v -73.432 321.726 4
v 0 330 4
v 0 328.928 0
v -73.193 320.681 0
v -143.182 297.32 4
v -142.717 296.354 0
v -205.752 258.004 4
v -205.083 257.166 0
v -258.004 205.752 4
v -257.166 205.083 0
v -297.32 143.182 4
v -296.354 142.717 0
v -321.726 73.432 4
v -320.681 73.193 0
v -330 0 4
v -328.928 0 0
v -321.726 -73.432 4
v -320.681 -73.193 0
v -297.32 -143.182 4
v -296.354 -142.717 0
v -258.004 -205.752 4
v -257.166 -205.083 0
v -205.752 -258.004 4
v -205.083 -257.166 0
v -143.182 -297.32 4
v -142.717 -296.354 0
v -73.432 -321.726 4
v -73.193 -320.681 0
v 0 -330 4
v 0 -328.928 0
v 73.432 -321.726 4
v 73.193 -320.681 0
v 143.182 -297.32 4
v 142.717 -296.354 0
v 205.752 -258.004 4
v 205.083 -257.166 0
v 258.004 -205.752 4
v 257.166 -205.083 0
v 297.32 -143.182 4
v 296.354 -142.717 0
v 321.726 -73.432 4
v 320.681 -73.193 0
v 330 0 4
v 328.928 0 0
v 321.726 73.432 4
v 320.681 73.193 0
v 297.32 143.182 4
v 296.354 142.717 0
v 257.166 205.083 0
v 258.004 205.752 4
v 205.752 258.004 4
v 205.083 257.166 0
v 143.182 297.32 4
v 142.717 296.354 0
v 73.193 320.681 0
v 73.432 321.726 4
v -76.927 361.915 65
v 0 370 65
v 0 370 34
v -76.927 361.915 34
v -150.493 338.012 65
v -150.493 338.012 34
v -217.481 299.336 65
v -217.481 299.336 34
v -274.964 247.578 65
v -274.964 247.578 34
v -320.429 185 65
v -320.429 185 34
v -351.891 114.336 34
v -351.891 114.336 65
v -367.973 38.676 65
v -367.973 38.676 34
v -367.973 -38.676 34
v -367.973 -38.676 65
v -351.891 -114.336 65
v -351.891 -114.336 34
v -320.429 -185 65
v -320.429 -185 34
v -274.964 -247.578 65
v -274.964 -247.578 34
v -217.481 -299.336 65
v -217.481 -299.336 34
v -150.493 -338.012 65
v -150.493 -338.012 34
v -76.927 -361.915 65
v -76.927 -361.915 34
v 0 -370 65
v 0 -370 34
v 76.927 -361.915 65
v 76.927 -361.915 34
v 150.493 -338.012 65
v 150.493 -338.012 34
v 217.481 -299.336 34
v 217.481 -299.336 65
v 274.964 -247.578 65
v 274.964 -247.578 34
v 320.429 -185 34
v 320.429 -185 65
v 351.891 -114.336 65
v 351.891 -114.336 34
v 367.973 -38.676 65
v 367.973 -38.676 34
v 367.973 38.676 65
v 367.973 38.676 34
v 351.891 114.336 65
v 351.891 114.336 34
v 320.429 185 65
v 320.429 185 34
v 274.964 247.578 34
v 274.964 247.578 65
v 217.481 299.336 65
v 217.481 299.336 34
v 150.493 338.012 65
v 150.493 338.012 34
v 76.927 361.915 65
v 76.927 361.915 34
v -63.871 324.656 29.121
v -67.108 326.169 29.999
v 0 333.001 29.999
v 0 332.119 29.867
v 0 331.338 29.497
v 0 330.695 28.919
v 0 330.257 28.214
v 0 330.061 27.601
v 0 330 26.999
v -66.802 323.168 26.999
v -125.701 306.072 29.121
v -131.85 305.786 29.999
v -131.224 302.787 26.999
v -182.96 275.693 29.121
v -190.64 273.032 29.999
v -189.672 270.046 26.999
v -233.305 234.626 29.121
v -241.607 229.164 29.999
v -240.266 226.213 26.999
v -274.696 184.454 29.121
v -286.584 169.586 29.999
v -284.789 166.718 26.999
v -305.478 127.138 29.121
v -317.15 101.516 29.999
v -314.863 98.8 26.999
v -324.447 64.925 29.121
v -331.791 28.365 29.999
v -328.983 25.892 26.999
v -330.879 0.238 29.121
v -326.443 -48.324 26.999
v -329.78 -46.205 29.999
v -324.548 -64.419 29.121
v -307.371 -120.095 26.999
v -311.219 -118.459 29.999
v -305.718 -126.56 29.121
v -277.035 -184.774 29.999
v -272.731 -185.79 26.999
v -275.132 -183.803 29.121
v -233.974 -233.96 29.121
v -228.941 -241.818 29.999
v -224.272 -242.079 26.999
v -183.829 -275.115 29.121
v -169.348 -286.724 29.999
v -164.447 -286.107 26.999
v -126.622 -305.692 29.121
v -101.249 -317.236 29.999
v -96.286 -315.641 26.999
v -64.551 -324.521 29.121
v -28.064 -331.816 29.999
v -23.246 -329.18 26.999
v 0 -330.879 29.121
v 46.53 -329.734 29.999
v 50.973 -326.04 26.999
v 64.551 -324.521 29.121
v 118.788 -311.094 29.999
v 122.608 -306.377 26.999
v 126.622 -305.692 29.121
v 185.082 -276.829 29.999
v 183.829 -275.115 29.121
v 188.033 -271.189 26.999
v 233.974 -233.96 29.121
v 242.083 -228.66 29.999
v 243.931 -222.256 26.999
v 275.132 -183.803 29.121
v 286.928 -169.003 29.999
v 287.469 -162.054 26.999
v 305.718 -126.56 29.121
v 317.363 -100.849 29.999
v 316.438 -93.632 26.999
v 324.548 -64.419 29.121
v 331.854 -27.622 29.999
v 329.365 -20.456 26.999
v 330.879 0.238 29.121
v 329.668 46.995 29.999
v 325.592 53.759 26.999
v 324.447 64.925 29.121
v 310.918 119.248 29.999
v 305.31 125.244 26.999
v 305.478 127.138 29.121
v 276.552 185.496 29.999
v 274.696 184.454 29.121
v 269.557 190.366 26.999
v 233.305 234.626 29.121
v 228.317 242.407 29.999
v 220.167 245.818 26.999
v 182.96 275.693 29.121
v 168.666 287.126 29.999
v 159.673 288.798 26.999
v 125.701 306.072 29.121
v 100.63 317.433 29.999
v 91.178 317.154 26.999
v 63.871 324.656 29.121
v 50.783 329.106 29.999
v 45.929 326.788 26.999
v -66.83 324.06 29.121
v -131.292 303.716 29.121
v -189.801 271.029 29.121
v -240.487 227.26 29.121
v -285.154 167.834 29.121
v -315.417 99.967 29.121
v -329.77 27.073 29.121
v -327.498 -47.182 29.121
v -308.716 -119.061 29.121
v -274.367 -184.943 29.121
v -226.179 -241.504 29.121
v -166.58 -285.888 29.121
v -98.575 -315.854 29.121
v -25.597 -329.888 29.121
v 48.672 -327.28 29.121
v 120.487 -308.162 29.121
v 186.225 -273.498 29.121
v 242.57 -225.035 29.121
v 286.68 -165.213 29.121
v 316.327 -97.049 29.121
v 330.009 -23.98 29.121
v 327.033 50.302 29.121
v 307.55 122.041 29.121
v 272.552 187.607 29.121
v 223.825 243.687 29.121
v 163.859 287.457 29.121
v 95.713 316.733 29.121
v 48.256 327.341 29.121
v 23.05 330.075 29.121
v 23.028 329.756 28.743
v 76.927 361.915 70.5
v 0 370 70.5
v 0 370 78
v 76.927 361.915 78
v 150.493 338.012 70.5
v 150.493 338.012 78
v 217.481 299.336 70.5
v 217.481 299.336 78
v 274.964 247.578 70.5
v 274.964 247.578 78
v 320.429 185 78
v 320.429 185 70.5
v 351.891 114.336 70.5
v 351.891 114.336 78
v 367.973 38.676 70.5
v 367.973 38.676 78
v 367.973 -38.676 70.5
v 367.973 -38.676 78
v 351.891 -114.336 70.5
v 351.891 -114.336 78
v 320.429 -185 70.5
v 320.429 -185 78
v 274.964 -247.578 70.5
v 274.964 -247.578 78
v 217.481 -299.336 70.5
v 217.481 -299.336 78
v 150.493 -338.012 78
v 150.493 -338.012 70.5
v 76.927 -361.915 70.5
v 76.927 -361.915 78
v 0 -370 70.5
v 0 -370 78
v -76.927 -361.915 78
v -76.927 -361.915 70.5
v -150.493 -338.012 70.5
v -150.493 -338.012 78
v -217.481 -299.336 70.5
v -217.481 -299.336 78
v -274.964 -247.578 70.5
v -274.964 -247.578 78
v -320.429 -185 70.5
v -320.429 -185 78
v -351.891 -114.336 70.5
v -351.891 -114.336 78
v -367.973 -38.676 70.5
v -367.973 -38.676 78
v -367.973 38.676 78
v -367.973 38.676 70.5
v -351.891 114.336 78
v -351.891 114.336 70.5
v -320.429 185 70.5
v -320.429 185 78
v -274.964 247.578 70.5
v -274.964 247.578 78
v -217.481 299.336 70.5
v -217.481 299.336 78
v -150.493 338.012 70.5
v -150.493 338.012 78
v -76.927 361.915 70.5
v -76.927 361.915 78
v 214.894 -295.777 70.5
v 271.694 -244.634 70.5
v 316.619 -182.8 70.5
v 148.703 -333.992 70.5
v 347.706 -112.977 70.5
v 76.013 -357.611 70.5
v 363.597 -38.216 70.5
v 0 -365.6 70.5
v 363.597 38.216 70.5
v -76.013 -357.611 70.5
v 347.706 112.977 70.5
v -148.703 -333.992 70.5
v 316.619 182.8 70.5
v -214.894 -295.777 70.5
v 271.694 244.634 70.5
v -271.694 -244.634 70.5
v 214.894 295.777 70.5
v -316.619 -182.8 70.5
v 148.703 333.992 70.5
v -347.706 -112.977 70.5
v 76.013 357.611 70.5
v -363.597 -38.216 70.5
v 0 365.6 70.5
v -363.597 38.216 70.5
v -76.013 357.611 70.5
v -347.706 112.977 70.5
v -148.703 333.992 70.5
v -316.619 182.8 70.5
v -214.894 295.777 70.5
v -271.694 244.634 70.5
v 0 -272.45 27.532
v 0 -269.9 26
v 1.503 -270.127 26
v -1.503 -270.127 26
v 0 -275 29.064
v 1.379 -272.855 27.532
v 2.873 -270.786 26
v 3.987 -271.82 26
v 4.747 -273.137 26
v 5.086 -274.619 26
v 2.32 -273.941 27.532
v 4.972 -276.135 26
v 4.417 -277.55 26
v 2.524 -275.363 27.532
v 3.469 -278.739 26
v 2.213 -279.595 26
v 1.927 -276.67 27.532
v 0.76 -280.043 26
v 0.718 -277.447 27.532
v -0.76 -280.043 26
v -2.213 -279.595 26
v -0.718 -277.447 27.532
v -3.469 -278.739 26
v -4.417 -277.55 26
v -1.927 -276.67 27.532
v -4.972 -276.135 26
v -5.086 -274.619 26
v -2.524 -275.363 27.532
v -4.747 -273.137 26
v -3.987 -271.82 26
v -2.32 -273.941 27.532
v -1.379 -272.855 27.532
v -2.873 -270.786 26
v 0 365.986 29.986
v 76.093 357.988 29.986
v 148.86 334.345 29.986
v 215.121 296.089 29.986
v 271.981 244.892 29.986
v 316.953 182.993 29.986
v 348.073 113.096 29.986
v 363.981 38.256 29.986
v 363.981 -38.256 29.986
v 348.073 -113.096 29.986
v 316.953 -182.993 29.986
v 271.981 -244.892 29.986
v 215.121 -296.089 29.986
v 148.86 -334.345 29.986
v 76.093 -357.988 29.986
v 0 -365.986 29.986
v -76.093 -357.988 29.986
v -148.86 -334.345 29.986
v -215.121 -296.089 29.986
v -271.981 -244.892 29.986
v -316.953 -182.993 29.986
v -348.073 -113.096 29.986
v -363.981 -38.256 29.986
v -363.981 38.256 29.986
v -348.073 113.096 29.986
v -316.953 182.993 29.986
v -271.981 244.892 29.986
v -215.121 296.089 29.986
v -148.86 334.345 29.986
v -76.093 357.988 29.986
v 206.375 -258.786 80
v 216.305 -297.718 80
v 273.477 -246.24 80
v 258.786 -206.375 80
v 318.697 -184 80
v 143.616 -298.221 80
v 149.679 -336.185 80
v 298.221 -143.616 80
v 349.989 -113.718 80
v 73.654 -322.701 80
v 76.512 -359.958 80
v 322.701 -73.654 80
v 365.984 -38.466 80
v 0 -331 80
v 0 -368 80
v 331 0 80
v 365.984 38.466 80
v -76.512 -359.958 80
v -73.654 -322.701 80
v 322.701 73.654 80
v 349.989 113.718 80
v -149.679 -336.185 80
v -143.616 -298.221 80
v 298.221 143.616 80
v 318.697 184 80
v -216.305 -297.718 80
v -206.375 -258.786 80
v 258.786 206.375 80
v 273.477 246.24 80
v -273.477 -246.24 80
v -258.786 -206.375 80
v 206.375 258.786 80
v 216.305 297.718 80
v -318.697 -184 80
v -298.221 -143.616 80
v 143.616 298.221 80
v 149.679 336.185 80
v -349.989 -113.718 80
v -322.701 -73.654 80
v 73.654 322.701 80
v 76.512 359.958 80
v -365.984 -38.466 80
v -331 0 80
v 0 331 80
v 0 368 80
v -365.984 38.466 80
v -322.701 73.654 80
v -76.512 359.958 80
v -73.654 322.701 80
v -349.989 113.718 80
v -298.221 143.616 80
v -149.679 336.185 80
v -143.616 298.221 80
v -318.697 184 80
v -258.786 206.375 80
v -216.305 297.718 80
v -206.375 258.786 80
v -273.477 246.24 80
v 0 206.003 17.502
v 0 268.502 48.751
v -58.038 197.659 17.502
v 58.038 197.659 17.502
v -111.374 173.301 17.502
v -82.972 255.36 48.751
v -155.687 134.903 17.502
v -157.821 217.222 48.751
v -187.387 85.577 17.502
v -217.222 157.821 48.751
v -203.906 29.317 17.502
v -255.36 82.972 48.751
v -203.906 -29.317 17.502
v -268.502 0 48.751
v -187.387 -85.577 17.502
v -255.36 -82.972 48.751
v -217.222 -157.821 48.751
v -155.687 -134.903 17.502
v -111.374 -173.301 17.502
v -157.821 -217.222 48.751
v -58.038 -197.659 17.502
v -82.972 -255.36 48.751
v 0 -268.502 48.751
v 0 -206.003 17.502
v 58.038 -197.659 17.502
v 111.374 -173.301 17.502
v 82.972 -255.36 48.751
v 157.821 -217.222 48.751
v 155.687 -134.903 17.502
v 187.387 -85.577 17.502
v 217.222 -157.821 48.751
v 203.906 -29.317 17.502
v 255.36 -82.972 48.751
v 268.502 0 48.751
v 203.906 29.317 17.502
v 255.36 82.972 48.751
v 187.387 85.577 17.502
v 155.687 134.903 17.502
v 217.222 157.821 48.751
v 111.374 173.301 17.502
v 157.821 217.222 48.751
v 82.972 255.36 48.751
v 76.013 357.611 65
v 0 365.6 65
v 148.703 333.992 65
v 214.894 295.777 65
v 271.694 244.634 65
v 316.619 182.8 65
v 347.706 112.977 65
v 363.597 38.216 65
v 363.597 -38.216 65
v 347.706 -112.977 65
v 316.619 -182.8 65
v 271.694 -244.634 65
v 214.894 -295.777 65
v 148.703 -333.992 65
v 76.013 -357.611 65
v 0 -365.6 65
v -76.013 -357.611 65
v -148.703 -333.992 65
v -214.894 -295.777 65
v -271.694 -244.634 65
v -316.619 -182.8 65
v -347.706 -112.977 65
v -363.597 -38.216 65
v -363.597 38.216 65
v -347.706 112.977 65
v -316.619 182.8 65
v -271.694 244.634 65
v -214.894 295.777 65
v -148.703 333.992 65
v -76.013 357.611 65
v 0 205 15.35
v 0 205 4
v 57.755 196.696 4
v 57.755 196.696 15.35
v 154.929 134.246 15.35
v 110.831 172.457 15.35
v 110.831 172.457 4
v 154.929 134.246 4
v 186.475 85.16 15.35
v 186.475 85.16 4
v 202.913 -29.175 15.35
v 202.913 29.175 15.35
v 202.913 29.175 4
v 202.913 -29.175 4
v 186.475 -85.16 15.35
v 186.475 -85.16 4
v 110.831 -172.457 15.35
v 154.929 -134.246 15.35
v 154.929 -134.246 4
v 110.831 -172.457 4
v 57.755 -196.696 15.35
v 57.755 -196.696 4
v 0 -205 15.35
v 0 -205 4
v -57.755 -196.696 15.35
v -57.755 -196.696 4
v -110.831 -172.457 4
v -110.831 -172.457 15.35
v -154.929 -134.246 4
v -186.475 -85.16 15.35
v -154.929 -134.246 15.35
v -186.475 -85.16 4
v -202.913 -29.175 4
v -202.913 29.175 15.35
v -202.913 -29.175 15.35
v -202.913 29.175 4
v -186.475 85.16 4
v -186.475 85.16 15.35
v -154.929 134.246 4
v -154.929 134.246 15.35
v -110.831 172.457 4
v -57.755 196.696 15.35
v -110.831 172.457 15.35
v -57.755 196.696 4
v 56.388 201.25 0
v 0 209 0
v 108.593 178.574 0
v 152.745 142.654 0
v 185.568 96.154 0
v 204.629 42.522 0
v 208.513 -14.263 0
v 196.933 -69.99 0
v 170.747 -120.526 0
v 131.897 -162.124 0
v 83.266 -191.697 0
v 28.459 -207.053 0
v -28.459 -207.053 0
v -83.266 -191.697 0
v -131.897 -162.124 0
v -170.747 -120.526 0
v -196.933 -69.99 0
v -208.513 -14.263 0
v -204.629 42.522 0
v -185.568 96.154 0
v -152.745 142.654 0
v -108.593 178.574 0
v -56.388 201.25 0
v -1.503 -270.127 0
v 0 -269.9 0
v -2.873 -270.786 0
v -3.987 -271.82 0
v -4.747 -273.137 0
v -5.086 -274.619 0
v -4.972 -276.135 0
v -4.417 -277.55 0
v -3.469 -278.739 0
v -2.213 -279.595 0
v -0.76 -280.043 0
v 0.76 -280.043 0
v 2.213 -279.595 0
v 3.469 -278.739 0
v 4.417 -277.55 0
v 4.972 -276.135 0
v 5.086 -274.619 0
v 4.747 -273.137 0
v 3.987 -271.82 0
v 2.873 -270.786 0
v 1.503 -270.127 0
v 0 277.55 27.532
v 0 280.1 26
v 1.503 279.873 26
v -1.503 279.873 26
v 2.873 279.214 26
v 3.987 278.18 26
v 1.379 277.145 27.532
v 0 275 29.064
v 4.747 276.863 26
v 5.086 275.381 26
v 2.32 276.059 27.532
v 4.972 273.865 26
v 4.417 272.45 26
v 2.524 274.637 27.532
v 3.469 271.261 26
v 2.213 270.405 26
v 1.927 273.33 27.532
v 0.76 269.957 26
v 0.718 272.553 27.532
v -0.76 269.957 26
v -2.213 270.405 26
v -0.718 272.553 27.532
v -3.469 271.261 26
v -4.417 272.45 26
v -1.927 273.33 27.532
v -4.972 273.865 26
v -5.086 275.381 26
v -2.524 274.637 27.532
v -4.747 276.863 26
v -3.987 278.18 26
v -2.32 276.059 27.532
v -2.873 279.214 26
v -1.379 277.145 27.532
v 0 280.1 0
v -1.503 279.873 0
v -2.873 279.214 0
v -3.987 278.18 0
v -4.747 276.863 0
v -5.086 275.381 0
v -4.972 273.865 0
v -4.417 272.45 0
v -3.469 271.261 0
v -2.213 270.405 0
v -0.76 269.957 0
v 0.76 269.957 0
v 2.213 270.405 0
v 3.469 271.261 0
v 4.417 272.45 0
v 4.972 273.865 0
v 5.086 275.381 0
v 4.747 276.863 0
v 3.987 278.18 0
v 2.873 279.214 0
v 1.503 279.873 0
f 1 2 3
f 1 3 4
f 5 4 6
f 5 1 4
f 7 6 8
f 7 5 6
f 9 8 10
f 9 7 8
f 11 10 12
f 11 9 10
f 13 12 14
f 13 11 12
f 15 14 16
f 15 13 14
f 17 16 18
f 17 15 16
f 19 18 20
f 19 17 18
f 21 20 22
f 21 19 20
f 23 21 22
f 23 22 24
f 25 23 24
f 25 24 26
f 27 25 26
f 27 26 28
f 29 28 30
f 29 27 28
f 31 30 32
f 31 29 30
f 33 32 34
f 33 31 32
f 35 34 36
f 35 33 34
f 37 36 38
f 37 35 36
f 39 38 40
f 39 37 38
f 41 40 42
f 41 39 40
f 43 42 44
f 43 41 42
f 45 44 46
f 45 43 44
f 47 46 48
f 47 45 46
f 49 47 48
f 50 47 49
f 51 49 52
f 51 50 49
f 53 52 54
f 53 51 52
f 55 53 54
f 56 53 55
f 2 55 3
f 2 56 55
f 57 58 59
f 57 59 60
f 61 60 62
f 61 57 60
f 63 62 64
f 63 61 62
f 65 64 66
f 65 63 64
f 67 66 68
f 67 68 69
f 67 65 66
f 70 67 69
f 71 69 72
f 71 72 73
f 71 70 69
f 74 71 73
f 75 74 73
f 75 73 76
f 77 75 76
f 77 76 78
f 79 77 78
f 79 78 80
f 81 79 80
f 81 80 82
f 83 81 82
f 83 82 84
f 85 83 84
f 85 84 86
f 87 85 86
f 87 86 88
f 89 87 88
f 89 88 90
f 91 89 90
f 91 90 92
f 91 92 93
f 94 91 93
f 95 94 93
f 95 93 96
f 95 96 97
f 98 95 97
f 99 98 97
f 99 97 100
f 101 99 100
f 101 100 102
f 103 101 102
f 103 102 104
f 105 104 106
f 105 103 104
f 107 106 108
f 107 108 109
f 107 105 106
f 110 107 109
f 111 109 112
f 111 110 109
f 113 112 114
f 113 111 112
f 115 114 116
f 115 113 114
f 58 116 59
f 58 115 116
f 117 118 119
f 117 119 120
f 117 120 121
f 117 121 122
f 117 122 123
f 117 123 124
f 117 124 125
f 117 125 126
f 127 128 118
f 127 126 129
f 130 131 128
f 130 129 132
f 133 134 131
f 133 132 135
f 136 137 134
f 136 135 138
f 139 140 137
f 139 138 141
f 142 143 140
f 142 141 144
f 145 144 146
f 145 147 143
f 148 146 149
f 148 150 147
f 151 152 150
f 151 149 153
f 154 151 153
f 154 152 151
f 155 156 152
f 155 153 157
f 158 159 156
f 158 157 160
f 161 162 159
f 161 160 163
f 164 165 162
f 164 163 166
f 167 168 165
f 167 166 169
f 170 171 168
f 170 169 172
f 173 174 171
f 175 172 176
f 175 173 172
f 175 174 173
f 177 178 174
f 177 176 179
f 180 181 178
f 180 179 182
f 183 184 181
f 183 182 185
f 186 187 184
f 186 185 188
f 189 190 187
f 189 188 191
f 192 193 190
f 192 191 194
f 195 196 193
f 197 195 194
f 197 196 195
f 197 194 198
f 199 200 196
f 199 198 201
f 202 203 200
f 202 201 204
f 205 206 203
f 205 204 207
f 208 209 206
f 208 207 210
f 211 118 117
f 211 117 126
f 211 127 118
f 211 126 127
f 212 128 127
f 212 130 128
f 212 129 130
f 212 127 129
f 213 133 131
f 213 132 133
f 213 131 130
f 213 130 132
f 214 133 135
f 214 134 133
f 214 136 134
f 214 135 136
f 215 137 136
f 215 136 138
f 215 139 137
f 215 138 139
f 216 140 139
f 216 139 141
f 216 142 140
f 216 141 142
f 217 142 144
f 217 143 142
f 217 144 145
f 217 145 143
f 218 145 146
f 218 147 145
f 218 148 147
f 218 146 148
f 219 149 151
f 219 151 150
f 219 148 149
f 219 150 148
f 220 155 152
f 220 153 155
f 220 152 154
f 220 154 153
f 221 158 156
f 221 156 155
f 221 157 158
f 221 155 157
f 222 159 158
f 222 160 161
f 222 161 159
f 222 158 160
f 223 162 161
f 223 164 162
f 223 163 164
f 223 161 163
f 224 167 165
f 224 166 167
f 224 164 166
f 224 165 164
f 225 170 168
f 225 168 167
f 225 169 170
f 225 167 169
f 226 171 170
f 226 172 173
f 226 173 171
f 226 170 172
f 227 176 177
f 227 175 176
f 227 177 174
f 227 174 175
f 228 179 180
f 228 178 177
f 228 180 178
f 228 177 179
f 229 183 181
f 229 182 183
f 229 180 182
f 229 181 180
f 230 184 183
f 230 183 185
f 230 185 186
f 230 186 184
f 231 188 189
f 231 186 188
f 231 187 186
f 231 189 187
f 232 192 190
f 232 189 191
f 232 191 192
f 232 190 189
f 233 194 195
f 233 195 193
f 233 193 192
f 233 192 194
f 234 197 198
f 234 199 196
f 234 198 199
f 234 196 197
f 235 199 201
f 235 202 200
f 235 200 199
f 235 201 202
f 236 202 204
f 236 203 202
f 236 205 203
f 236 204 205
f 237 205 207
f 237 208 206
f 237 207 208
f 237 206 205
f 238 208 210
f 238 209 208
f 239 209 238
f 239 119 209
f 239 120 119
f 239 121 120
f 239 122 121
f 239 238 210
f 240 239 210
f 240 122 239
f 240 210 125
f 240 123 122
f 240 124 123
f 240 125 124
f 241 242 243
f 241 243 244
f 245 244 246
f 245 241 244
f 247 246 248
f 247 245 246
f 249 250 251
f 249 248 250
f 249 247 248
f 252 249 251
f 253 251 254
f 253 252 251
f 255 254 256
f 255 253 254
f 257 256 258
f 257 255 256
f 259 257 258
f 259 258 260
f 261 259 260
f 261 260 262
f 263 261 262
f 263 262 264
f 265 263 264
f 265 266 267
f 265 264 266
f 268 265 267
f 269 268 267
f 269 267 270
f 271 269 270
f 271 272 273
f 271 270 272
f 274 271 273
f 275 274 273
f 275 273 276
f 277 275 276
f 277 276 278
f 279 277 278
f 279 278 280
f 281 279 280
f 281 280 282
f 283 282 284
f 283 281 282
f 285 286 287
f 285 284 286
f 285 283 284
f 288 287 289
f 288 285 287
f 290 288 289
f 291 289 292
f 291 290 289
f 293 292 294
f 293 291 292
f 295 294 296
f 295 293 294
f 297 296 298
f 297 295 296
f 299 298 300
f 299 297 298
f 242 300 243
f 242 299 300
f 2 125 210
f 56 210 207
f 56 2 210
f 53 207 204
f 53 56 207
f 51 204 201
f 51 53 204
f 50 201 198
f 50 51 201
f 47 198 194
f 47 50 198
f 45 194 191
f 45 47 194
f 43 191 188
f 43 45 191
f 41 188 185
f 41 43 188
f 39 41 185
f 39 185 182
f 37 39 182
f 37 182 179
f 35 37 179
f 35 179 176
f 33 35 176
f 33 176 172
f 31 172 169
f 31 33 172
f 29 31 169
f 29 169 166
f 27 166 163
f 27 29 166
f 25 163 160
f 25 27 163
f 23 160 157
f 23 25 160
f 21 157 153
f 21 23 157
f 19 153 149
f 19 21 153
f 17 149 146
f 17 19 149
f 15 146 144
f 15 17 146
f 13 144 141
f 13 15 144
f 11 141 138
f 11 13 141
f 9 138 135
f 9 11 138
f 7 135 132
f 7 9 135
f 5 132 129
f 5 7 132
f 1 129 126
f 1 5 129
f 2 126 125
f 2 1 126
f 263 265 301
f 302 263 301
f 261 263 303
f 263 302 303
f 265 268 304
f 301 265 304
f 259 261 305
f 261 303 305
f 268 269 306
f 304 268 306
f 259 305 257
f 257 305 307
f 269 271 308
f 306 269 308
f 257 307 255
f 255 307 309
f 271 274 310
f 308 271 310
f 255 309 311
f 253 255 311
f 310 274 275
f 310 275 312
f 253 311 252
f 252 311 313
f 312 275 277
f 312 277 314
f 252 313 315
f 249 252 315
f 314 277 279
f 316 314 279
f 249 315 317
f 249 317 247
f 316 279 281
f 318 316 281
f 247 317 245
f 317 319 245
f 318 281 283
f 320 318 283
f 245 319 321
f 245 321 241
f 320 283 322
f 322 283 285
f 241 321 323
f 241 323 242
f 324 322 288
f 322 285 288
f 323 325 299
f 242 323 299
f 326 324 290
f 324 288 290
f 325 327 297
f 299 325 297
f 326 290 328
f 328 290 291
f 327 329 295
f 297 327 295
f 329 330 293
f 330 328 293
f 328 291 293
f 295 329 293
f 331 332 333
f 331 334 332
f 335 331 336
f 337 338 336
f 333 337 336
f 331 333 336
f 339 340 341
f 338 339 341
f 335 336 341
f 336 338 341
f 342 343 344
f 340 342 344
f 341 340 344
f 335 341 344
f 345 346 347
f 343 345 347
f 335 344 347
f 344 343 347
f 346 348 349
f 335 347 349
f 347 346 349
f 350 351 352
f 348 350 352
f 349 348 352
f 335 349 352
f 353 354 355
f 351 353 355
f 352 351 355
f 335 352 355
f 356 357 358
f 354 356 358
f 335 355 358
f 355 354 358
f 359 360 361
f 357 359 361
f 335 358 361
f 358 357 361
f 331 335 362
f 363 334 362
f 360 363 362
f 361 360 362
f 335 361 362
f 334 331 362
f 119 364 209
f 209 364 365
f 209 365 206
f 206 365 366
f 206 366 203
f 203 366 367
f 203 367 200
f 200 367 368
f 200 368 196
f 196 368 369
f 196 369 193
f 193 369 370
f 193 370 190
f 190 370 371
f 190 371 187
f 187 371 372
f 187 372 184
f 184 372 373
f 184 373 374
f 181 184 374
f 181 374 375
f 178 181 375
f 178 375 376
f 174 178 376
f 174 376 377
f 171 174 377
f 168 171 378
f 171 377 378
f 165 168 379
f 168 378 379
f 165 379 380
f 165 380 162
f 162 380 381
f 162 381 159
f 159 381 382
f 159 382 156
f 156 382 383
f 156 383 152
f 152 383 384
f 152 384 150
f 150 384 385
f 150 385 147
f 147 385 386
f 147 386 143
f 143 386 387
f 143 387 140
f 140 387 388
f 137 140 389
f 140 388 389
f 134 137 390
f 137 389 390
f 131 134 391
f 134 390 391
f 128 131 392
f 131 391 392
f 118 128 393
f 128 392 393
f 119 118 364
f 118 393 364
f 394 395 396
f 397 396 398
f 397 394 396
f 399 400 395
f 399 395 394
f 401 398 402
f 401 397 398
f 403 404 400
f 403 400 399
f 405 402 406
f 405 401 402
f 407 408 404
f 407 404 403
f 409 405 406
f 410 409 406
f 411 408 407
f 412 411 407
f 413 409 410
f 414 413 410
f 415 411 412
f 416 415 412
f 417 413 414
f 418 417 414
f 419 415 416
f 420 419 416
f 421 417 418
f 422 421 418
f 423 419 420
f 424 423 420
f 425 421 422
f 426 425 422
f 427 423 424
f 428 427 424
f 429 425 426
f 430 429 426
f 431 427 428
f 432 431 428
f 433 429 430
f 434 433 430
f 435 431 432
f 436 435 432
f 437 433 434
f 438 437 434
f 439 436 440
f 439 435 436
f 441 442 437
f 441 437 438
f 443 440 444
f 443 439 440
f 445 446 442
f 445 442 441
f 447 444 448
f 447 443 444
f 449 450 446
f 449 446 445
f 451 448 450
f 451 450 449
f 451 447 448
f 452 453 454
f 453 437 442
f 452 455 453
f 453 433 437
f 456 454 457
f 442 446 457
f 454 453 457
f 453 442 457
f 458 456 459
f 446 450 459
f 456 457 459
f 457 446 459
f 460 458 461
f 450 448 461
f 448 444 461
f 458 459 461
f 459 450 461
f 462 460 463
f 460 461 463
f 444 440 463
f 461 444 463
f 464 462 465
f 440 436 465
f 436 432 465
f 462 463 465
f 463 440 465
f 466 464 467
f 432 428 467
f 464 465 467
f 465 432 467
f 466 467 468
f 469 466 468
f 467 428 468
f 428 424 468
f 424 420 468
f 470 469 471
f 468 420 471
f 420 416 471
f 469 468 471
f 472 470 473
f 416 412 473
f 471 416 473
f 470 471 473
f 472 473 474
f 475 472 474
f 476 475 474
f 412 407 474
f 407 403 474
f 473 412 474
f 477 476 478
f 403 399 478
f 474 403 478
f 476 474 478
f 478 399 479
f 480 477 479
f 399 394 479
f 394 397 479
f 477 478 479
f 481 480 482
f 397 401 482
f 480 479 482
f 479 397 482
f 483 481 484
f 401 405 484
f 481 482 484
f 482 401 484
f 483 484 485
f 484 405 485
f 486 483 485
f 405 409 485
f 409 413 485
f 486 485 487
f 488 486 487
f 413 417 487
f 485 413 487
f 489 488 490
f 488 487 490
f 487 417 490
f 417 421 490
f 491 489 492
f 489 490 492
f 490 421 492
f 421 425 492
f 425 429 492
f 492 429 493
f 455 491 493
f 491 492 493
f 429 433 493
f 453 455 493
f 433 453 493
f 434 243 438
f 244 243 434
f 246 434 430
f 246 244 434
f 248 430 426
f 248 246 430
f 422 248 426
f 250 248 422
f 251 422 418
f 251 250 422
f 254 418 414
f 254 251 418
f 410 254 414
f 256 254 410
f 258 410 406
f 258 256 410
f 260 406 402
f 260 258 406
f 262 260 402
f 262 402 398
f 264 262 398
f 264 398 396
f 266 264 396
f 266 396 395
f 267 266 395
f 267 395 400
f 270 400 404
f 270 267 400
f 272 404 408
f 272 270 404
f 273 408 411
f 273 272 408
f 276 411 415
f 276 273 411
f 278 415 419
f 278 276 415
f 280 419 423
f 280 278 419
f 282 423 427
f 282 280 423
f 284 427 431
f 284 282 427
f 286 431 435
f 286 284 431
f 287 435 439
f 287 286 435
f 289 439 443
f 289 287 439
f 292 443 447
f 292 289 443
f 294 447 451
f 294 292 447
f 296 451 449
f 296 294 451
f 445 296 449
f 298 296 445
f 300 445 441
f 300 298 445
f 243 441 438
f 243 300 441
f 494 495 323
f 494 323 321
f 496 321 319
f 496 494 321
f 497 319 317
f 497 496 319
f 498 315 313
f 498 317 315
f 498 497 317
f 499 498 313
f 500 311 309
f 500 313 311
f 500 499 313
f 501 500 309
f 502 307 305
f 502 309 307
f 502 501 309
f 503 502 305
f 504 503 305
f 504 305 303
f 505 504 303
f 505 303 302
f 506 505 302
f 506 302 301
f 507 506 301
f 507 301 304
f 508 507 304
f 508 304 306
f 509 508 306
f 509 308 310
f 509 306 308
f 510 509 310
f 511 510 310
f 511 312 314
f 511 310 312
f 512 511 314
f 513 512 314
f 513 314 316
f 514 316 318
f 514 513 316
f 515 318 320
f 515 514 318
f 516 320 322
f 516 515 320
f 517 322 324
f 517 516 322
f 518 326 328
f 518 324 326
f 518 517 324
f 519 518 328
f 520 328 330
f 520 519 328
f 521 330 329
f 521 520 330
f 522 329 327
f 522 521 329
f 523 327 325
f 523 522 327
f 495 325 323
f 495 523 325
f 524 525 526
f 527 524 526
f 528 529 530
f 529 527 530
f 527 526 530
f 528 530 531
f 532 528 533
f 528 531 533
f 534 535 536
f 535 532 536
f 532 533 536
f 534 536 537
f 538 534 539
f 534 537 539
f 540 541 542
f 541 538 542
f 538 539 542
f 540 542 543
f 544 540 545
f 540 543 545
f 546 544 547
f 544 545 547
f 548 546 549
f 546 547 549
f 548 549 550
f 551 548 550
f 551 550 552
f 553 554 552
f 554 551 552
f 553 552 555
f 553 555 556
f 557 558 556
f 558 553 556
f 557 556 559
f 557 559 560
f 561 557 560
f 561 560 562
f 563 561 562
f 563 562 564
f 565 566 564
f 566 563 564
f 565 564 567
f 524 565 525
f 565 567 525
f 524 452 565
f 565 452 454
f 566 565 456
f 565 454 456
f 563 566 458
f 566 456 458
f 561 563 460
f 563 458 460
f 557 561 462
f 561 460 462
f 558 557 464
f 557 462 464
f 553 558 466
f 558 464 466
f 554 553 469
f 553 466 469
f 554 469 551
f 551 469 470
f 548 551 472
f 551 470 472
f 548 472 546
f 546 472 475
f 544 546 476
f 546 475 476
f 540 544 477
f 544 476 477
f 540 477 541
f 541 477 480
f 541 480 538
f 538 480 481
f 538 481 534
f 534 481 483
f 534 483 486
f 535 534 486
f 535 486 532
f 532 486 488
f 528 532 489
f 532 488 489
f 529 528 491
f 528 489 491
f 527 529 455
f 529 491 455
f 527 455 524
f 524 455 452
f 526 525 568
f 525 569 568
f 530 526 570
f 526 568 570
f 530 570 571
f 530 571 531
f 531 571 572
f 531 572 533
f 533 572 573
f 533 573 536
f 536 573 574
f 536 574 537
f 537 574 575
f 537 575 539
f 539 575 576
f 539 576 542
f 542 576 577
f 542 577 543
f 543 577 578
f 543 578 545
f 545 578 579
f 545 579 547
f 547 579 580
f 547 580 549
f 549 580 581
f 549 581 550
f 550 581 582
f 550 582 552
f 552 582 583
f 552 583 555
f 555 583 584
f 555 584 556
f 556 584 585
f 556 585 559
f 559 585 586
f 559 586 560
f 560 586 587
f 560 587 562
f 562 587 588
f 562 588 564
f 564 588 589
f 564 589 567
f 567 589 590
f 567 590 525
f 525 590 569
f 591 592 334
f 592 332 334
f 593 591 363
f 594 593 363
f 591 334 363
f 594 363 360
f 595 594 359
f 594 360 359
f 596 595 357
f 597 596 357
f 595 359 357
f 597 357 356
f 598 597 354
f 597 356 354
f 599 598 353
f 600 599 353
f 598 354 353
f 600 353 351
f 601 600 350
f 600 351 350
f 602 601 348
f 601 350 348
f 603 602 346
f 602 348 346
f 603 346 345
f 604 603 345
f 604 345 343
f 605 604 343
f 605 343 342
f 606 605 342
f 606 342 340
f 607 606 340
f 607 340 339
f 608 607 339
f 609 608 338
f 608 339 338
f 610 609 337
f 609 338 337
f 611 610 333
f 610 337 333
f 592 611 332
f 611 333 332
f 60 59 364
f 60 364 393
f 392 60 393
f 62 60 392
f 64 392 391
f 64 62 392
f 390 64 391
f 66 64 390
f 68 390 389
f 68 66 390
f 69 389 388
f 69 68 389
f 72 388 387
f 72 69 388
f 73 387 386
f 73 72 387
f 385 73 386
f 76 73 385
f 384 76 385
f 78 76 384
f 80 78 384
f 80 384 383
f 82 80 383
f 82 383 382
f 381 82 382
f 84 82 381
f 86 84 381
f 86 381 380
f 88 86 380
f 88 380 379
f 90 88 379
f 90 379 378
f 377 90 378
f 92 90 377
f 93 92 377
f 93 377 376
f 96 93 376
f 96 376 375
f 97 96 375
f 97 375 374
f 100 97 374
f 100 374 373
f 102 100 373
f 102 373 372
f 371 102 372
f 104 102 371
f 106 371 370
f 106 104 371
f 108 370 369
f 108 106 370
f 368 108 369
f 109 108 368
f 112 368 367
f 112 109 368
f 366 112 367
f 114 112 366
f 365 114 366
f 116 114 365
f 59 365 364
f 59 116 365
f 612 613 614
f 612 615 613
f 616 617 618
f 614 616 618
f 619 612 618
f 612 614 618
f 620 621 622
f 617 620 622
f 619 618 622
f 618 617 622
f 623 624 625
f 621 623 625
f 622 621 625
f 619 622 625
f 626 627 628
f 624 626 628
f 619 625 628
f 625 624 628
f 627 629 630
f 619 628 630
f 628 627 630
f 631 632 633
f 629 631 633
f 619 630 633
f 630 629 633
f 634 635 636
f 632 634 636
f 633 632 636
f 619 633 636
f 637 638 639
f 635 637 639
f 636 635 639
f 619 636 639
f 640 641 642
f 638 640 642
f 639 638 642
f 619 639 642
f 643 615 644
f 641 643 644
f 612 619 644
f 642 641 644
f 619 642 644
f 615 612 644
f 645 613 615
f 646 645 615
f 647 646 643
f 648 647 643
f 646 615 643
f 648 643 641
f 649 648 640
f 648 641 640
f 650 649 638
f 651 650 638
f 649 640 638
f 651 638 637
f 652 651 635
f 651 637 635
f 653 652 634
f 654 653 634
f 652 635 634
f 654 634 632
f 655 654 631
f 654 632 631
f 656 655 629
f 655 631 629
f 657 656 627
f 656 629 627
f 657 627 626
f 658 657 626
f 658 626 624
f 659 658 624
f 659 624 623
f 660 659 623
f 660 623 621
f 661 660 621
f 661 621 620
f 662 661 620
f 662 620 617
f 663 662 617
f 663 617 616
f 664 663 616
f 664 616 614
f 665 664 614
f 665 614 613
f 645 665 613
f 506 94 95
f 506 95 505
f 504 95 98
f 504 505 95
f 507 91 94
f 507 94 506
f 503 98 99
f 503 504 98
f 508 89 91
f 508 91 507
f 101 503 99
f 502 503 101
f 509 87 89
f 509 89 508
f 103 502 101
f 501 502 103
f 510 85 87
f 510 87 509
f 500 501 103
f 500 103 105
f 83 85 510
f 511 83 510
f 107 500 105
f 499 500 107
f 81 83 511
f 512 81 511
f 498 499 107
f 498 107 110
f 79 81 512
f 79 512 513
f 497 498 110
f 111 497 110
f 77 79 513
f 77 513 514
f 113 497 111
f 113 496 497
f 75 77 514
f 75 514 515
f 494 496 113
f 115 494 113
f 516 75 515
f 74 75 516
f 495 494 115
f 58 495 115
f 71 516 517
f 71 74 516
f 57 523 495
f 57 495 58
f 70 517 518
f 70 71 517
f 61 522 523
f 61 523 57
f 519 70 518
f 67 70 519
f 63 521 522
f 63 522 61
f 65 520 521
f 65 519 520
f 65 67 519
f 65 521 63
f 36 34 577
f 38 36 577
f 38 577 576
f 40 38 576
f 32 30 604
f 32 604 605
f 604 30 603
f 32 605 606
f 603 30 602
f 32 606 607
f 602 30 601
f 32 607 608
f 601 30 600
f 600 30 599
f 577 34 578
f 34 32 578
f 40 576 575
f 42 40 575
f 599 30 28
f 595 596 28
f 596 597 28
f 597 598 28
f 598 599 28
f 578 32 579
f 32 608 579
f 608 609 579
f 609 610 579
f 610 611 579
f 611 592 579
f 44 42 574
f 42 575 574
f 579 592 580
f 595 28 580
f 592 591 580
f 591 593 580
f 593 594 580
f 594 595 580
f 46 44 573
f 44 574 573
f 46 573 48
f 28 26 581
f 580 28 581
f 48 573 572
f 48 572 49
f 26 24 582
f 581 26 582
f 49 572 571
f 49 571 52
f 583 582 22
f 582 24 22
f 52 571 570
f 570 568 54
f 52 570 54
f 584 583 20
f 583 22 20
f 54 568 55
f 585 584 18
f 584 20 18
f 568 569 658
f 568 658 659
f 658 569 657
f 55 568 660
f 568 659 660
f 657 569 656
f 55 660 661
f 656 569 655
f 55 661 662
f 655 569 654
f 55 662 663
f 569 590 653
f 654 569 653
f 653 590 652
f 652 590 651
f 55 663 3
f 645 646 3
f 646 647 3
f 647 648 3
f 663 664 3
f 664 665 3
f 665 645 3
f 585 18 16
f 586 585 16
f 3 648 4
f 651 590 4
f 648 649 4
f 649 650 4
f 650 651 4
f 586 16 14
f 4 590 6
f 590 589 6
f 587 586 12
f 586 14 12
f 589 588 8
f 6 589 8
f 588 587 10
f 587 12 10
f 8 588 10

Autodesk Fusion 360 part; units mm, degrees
sketch "Sketch1" plane through (0, 0, 0) normal (1, 0, 0) x (0, 0, -1)
  line L0 (-70.5, 370) -> (-70.5, 365.6)
  line L1 (-70.5, 365.6) -> (-65, 365.6)
  line L2 (-65, 365.6) -> (-65, 370)
  line L3 (-34, 370) -> (-29.986, 365.986)
  line L4 (-34, 370) -> (-65, 370)
  line L5 (-29.986, 365.986) -> (-30, 330)
  line L6 (-78, 370) -> (-80, 368)
  line L7 (-78, 370) -> (-70.5, 370)
  line L8 (-80, 368) -> (-80, 331)
  line L9 (-4, 330) -> (0, 328.9282)
  line L10 (-30, 330) -> (-4, 330)
  line L11 (-15.35, 205) -> (-17.5017, 206.0033)
  line L12 (-17.5017, 206.0033) -> (-80, 331)
  line L13 (-4, 205) -> (0, 209)
  line L14 (-15.35, 205) -> (-4, 205)
  line L15 (0, 328.9282) -> (0, 209)
  dimension "d11" = 4.4
  dimension "d12" = 5.5
revolve "Revolve1" add sketch "Sketch1" angle 360 about axis through (0, 0, 1.75) along (0, 0, 1)
sketch "Sketch2" plane through (0, 0, 0) normal (0, 0, -1) x (-1, 0, 0)
  circle A0 centre (0, 0) radius 328.9282
  circle A1 centre (0, 0) radius 209
  circle A2 centre (0, 275) radius 5.5
  circle A3 centre (0, -275) radius 5.5
  dimension "d24" = 11
  dimension "d25" = 11
hole "Hole1" at (0, 275, 0) at (0, -275, 0) direction (0, 0, 1) diameter 10.2 depth 26 tip angle 118
thread "Thread1" thread offset 0 thread length 18
fillet "Fillet1" radius 3 1 edges at (-307.668, 119.3331, 30)
